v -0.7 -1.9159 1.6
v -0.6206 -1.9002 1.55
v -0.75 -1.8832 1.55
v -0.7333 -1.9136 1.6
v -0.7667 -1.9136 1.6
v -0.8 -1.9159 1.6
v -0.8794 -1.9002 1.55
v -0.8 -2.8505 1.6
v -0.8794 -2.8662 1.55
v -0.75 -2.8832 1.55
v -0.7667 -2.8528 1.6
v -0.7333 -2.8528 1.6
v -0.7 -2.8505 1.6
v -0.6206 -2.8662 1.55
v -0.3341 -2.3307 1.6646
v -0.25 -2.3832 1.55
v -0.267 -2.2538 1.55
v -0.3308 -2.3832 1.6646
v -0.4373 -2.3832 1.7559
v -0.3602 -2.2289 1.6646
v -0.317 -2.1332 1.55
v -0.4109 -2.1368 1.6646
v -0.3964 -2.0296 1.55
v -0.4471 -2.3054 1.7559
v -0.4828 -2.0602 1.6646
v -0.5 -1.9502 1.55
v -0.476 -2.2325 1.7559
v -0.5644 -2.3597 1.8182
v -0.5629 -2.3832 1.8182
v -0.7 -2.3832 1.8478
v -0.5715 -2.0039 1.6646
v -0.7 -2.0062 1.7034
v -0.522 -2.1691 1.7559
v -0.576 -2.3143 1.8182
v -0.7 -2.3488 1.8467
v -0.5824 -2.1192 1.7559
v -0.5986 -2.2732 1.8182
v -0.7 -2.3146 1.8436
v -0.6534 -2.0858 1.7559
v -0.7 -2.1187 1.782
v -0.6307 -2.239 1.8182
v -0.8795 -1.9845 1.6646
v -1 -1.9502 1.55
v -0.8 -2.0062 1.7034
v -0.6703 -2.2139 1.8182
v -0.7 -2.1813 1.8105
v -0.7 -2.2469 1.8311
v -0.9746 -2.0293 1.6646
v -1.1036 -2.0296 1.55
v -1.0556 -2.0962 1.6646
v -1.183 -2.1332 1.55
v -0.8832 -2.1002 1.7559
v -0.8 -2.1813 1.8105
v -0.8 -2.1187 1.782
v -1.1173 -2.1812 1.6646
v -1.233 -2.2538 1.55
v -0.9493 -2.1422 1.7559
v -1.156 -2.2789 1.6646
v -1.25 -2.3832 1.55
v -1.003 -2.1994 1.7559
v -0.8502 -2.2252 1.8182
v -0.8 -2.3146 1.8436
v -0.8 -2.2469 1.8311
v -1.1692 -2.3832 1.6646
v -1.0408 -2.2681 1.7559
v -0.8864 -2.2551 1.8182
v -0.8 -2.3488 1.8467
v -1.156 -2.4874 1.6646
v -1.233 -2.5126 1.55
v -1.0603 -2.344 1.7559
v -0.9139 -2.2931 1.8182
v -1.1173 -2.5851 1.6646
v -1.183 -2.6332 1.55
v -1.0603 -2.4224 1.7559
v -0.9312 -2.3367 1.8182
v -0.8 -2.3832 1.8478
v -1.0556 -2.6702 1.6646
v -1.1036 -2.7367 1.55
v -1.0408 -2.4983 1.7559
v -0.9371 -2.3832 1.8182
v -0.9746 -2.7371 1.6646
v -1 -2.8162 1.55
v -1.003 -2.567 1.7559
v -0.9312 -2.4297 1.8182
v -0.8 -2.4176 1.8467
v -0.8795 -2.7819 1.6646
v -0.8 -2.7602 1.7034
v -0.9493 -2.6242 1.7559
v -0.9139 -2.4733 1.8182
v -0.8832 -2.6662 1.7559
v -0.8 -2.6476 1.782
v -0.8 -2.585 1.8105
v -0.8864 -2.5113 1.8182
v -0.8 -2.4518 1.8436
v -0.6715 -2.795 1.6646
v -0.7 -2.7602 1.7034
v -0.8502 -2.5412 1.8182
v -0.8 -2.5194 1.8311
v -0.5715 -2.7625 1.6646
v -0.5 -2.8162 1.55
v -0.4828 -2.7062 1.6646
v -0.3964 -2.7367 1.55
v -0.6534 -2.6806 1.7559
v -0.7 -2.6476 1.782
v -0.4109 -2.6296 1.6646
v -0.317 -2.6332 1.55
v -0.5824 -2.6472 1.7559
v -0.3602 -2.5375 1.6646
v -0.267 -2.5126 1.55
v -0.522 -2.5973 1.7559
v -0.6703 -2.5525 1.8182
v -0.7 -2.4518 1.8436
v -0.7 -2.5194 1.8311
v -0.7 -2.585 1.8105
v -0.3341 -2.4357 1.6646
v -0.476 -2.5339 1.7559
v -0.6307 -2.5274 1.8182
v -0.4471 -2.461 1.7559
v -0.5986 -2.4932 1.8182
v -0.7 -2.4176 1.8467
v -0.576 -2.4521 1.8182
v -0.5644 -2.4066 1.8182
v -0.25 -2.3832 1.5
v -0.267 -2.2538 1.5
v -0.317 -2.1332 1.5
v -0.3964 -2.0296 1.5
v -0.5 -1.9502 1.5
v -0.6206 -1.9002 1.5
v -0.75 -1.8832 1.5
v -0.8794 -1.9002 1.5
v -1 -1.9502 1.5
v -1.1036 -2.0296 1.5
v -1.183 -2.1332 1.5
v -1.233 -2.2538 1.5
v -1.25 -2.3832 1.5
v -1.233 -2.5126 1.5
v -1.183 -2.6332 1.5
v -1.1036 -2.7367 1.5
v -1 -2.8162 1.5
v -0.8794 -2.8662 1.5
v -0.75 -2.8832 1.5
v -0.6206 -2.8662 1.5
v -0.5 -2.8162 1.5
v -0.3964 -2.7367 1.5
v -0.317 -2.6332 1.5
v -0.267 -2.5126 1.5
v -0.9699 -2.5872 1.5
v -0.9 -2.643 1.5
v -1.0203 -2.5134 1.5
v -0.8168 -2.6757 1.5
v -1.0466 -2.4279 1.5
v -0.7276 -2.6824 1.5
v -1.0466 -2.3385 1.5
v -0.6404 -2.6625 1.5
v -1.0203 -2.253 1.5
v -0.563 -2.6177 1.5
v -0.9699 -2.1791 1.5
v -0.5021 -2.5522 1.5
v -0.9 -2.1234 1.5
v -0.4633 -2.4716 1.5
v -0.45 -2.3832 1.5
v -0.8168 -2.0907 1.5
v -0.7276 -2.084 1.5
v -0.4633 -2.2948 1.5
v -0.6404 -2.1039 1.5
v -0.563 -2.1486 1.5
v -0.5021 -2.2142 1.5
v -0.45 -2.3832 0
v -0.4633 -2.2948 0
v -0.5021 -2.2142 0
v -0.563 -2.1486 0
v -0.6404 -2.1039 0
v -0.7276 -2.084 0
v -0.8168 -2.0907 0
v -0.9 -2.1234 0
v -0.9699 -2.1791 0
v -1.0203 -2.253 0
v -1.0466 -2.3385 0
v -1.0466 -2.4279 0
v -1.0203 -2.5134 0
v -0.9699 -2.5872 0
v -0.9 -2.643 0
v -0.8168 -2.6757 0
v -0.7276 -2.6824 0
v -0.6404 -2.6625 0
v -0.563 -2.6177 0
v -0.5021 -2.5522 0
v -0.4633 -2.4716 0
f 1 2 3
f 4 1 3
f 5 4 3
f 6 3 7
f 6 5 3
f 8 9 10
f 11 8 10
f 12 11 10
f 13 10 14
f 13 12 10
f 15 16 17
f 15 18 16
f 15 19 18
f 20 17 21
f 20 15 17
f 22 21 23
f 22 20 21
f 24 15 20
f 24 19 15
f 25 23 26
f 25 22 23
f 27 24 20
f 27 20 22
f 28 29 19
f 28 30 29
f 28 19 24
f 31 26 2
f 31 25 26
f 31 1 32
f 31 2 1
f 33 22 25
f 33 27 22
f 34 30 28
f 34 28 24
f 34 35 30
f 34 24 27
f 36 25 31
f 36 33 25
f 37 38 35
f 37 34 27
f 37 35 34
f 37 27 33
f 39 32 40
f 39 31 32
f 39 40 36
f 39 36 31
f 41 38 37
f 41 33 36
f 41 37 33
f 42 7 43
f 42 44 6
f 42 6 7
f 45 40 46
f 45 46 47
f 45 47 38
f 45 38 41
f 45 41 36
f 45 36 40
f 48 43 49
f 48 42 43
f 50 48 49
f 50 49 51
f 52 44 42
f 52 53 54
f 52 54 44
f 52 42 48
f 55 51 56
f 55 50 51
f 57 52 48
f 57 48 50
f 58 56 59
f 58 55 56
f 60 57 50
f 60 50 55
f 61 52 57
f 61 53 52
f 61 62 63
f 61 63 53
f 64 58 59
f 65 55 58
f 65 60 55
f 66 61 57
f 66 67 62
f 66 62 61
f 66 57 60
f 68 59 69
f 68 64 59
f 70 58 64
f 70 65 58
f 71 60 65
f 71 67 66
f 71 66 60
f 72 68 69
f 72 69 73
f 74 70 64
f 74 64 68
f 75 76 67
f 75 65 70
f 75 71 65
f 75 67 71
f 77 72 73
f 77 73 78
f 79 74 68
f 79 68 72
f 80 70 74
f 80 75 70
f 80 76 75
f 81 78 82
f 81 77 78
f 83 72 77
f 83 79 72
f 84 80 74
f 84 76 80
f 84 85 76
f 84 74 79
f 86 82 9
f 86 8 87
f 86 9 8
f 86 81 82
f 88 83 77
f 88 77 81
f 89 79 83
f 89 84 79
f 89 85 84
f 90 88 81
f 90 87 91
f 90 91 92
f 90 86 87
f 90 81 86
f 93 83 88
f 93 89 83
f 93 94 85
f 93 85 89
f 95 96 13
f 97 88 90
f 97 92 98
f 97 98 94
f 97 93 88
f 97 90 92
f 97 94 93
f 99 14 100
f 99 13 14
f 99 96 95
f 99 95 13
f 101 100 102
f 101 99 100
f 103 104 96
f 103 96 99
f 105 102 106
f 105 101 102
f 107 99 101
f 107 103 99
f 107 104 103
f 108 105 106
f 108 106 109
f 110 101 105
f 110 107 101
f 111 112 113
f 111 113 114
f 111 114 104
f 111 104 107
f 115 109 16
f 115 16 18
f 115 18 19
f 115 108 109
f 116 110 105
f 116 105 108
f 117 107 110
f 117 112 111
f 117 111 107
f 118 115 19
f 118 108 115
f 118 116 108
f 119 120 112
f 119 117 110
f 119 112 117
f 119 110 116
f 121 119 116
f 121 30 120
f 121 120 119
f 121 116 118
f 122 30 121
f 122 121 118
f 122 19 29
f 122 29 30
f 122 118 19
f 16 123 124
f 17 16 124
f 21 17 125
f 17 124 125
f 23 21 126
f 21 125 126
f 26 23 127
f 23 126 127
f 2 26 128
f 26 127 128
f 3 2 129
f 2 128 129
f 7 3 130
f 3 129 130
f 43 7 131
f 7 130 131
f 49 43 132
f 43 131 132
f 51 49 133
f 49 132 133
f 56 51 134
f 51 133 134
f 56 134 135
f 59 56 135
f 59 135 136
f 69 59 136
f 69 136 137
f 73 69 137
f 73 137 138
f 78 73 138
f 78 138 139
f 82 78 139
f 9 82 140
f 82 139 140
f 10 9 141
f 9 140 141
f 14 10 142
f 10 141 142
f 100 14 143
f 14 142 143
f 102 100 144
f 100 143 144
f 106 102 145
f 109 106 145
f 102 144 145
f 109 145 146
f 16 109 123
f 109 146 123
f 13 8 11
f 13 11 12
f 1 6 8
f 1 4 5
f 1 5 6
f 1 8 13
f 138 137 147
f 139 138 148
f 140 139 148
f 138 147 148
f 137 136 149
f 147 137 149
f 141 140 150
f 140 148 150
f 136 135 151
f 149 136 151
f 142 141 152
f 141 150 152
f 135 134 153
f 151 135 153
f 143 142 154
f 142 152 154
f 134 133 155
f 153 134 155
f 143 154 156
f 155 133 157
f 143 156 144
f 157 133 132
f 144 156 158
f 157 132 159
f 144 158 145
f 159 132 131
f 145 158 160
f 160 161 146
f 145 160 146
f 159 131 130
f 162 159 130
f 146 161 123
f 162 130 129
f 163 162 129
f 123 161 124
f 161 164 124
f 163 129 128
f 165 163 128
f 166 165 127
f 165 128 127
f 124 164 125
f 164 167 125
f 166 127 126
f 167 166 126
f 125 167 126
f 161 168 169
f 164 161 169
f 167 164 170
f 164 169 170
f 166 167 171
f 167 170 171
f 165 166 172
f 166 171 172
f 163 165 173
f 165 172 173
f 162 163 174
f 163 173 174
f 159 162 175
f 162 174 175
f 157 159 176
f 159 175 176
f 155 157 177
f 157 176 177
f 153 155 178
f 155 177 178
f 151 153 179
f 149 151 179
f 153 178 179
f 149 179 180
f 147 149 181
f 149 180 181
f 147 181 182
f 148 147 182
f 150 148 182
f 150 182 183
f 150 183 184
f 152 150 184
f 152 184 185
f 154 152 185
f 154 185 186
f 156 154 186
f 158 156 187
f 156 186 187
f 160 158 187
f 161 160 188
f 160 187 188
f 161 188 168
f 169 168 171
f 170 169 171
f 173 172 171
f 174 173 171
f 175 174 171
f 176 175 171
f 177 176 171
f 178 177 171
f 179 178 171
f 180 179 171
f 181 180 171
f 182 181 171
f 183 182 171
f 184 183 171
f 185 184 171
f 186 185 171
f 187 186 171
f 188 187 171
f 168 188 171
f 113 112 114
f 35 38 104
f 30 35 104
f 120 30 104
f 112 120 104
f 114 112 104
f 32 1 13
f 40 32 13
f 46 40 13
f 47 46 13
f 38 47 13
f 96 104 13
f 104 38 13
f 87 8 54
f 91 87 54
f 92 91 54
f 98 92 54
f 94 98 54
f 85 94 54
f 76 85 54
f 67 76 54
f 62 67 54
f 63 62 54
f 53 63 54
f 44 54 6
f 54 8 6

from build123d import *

# Parameters (mm, degrees)
SKETCH_1_R          = 0.3
EXTRUDE_1_DEPTH     = 1.5
SKETCH_2_R          = 0.5
SKETCH_2_R_2        = 0.3
EXTRUDE_2_DEPTH     = 0.05
DOME_1_FACE_RADIUS  = 0.5
DOME_1_HEIGHT       = 0.3
CUT_EXTRUDE_1_DEPTH = 3.12


with BuildPart() as part:
    # 草图1 → 凸台-拉伸1 (new body)
    with BuildSketch(Plane.XY):
        with Locations((-0.75, -2.383195553)):
            Circle(SKETCH_1_R)
    extrude(amount=EXTRUDE_1_DEPTH)

    # 草图2 → 凸台-拉伸2 (add)
    with BuildSketch(Plane.XY.offset(1.5)):
        with Locations((-0.75, -2.383195553)):
            Circle(SKETCH_2_R)
        with Locations((-0.75, -2.383195553)):
            Circle(SKETCH_2_R_2, mode=Mode.SUBTRACT)
        with Locations((-0.75, -2.383195553)):
            Circle(SKETCH_2_R_2)
    extrude(amount=EXTRUDE_2_DEPTH)

    # 圆顶1: a dome of height H over a round flat face of radius A is a cap of a sphere of radius (A * A + H * H) / (2 * H)
    dome_1_r = (DOME_1_FACE_RADIUS * DOME_1_FACE_RADIUS + DOME_1_HEIGHT * DOME_1_HEIGHT) / (2 * DOME_1_HEIGHT)
    dome_1_base = Plane((-0.75, -2.383195553, 1.55), z_dir=(0, 0, 1))
    with Locations(dome_1_base.offset(DOME_1_HEIGHT - dome_1_r)):
        dome_1_ball = Sphere(dome_1_r, mode=Mode.PRIVATE)
    add(split(dome_1_ball, bisect_by=dome_1_base, keep=Keep.TOP, mode=Mode.PRIVATE))

    # 草图3 → 切除-拉伸1 (cut)
    with BuildSketch(Plane(origin=(0, 0, 1.6), x_dir=(-1, 0, 0), z_dir=(0, 0, -1))):
        Polygon((0.8, -2.383195553), (0.8, -3.010764218), (0.7, -3.010764218), (0.7, -2.383195553), (0.7, -1.624183347), (0.8, -1.624183347), align=None)
    extrude(amount=-CUT_EXTRUDE_1_DEPTH, mode=Mode.SUBTRACT)


solid = part.part
